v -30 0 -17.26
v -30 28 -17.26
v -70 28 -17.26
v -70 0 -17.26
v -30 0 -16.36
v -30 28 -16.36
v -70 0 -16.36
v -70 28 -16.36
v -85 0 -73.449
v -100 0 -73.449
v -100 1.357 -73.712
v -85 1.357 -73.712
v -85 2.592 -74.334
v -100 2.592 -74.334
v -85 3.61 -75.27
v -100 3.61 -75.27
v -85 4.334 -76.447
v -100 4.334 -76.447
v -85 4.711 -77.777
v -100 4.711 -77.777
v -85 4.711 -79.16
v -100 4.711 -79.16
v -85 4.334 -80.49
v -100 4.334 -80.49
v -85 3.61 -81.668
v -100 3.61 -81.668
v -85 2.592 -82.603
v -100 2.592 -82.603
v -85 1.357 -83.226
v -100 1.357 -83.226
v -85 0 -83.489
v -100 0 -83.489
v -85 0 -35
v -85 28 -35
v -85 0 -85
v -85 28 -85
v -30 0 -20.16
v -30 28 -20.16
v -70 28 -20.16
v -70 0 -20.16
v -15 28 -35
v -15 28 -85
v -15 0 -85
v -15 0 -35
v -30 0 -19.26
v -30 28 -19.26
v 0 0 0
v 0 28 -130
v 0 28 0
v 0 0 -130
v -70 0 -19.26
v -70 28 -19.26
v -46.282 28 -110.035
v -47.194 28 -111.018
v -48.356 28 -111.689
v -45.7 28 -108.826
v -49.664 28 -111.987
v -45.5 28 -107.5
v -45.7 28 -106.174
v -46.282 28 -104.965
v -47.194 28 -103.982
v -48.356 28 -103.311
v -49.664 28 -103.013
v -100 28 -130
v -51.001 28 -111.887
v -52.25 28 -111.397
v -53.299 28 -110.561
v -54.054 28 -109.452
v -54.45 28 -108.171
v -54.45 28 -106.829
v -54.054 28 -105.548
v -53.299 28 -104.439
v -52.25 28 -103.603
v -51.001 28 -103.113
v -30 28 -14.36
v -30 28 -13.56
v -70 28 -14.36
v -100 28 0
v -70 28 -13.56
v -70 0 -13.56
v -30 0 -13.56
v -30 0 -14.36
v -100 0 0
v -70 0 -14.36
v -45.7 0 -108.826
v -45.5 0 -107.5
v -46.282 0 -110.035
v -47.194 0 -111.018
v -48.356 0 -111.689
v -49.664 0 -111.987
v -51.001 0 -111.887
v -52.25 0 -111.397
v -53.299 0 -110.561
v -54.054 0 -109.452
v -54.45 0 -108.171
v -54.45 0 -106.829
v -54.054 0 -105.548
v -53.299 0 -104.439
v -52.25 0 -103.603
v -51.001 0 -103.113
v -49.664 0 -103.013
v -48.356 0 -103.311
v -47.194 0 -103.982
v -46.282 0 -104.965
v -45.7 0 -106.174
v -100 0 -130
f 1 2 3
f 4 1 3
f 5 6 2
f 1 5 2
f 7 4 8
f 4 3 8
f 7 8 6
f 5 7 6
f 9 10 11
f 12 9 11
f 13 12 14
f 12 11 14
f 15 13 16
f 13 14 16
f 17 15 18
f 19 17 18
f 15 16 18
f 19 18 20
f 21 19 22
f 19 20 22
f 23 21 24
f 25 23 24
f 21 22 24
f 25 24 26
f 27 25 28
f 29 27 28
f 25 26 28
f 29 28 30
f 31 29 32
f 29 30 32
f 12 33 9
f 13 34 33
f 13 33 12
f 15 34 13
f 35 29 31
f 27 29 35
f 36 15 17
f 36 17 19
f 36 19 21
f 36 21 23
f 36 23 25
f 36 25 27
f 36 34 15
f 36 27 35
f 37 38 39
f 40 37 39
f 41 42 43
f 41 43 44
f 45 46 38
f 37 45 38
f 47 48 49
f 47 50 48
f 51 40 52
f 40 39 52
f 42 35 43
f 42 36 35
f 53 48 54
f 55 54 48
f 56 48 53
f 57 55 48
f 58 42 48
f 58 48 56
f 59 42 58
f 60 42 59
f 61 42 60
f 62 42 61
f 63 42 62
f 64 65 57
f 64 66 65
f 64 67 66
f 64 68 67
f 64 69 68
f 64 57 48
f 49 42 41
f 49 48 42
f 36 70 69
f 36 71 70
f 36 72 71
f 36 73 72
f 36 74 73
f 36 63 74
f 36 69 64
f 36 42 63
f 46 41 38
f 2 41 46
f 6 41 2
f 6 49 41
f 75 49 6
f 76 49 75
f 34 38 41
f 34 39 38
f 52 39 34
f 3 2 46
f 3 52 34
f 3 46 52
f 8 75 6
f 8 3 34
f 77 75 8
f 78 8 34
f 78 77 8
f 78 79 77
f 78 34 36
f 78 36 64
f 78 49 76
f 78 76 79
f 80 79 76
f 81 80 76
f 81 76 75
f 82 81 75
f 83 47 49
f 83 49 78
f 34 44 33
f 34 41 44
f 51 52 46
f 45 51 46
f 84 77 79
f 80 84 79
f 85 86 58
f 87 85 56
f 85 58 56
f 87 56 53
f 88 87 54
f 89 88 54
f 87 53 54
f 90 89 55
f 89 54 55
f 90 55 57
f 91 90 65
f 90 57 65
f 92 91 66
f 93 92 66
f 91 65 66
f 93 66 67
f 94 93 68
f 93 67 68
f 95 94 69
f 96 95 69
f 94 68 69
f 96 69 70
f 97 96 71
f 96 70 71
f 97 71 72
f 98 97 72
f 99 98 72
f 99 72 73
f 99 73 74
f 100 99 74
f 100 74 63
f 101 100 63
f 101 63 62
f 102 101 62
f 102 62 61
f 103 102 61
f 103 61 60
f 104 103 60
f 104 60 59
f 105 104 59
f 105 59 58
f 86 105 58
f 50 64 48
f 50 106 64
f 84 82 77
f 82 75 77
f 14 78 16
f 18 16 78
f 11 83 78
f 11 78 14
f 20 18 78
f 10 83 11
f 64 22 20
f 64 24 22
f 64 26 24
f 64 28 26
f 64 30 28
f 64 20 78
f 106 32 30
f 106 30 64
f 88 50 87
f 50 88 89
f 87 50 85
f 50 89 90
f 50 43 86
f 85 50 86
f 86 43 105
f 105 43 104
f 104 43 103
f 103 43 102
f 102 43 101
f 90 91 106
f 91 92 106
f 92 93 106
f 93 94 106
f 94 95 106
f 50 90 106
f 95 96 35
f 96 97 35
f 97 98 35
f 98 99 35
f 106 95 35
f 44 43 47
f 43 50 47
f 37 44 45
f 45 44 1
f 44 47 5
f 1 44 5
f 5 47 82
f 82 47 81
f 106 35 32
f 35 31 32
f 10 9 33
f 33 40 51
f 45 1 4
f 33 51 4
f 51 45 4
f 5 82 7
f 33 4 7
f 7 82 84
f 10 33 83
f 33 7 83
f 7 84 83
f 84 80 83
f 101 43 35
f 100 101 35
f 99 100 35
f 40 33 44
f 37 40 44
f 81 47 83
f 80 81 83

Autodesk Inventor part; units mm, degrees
ref_plane "YZ Plane" through (0, 0, 0) normal (1, 0, 0) x (0, 1, 0)
ref_plane "XZ Plane" through (0, 0, 0) normal (0, 1, 0) x (-1, 0, 0)
ref_plane "XY Plane" through (0, 0, 0) normal (0, 0, 1) x (1, 0, 0)
sketch "Boceto1" plane through (0, 0, 0) normal (0, 1, 0) x (-1, 0, 0)
  line L0 (0, 0) -> (100, 0)
  line L1 (100, 0) -> (100, -130)
  line L2 (100, -130) -> (0, -130)
  line L3 (0, -130) -> (0, 0)
  dimension "d0" = 100
  dimension "d1" = 130
extrude "Extrusión1" add sketch "Boceto1" along normal blind 28
sketch "Boceto2" plane through (0, 28, 0) normal (0, 1, 0) x (1, 0, 0)
  line L0 (-70, 13.56) -> (-30, 13.56)
  line L1 (-30, 13.56) -> (-30, 14.36)
  line L2 (-30, 14.36) -> (-70, 14.36)
  line L3 (-70, 14.36) -> (-70, 13.56)
  line L4 (-100, 0) -> (0, 0) projected
  line L5 (0, 0) -> (0, 130) projected
  line L6 (-70, 16.36) -> (-30, 16.36)
  line L7 (-30, 16.36) -> (-30, 17.26)
  line L8 (-30, 17.26) -> (-70, 17.26)
  line L9 (-70, 17.26) -> (-70, 16.36)
  line L10 (-70, 19.26) -> (-30, 19.26)
  line L11 (-30, 19.26) -> (-30, 20.16)
  line L12 (-30, 20.16) -> (-70, 20.16)
  line L13 (-70, 20.16) -> (-70, 19.26)
  line L14 (-85, 85) -> (-15, 85)
  line L15 (-15, 85) -> (-15, 35)
  line L16 (-15, 35) -> (-85, 35)
  line L17 (-85, 35) -> (-85, 85)
  line L18 (-100, 130) -> (-100, 0) projected
  line L19 (0, 130) -> (-100, 130) projected
  circle A0 centre (-50, 107.5) radius 4.5
  dimension "d4" = 40
  dimension "d5" = 0.8
  dimension "d6" = 13.56
  dimension "d7" = 30
  dimension "d8" = 40
  dimension "d9" = 0.9
  dimension "d10" = 2
  dimension "d11" = 0
  dimension "d12" = 40
  dimension "d13" = 0.9
  dimension "d14" = 0
  dimension "d15" = 2
  dimension "d16" = 70
  dimension "d17" = 50
  dimension "d18" = 15
  dimension "d19" = 45
  dimension "d20" = 9
  dimension "d21" = 50
  dimension "d22" = 22.5
extrude "Extrusión2" cut sketch "Boceto2" against normal blind 28 contours L3 L2 L1 L0 | L9 L8 L7 L6 | L13 L12 L11 L10 | L14 L15 L16 L17 | A0
sketch "Boceto3" plane through (-100, 0, -130) normal (-1, 0, 0) x (0, 0, 1)
  line L0 (95, 0) -> (45, 0) projected
  arc A0 (56.5512, 0) -> (46.5113, 0) centre (51.5312, -0.2684) ccw
  point P0 (130, 0)
extrude "Extrusión3" cut sketch "Boceto3" against normal blind 15
equation "\"Radio_pliegue\" = Grosor"
equation "\"Anchura_desahogo_plegado\" = Grosor"
equation "\"Profundidad_desahogo_plegado\" = 0.5 * Grosor"
equation "\"Tamaño_destalonado\" = 4 * Grosor"
equation "\"Remanente_mínimo\" = 2 * Grosor"
equation "\"Radiodetransición\" = Radio_pliegue"
equation "\"Tamaño_de_radio_de_Jacobi\" = Radio_pliegue"
equation "\"TamañoSeparación\" = Grosor"
equation "\"Grosor\" = 0.5"
properties part number "carcasaV2"
